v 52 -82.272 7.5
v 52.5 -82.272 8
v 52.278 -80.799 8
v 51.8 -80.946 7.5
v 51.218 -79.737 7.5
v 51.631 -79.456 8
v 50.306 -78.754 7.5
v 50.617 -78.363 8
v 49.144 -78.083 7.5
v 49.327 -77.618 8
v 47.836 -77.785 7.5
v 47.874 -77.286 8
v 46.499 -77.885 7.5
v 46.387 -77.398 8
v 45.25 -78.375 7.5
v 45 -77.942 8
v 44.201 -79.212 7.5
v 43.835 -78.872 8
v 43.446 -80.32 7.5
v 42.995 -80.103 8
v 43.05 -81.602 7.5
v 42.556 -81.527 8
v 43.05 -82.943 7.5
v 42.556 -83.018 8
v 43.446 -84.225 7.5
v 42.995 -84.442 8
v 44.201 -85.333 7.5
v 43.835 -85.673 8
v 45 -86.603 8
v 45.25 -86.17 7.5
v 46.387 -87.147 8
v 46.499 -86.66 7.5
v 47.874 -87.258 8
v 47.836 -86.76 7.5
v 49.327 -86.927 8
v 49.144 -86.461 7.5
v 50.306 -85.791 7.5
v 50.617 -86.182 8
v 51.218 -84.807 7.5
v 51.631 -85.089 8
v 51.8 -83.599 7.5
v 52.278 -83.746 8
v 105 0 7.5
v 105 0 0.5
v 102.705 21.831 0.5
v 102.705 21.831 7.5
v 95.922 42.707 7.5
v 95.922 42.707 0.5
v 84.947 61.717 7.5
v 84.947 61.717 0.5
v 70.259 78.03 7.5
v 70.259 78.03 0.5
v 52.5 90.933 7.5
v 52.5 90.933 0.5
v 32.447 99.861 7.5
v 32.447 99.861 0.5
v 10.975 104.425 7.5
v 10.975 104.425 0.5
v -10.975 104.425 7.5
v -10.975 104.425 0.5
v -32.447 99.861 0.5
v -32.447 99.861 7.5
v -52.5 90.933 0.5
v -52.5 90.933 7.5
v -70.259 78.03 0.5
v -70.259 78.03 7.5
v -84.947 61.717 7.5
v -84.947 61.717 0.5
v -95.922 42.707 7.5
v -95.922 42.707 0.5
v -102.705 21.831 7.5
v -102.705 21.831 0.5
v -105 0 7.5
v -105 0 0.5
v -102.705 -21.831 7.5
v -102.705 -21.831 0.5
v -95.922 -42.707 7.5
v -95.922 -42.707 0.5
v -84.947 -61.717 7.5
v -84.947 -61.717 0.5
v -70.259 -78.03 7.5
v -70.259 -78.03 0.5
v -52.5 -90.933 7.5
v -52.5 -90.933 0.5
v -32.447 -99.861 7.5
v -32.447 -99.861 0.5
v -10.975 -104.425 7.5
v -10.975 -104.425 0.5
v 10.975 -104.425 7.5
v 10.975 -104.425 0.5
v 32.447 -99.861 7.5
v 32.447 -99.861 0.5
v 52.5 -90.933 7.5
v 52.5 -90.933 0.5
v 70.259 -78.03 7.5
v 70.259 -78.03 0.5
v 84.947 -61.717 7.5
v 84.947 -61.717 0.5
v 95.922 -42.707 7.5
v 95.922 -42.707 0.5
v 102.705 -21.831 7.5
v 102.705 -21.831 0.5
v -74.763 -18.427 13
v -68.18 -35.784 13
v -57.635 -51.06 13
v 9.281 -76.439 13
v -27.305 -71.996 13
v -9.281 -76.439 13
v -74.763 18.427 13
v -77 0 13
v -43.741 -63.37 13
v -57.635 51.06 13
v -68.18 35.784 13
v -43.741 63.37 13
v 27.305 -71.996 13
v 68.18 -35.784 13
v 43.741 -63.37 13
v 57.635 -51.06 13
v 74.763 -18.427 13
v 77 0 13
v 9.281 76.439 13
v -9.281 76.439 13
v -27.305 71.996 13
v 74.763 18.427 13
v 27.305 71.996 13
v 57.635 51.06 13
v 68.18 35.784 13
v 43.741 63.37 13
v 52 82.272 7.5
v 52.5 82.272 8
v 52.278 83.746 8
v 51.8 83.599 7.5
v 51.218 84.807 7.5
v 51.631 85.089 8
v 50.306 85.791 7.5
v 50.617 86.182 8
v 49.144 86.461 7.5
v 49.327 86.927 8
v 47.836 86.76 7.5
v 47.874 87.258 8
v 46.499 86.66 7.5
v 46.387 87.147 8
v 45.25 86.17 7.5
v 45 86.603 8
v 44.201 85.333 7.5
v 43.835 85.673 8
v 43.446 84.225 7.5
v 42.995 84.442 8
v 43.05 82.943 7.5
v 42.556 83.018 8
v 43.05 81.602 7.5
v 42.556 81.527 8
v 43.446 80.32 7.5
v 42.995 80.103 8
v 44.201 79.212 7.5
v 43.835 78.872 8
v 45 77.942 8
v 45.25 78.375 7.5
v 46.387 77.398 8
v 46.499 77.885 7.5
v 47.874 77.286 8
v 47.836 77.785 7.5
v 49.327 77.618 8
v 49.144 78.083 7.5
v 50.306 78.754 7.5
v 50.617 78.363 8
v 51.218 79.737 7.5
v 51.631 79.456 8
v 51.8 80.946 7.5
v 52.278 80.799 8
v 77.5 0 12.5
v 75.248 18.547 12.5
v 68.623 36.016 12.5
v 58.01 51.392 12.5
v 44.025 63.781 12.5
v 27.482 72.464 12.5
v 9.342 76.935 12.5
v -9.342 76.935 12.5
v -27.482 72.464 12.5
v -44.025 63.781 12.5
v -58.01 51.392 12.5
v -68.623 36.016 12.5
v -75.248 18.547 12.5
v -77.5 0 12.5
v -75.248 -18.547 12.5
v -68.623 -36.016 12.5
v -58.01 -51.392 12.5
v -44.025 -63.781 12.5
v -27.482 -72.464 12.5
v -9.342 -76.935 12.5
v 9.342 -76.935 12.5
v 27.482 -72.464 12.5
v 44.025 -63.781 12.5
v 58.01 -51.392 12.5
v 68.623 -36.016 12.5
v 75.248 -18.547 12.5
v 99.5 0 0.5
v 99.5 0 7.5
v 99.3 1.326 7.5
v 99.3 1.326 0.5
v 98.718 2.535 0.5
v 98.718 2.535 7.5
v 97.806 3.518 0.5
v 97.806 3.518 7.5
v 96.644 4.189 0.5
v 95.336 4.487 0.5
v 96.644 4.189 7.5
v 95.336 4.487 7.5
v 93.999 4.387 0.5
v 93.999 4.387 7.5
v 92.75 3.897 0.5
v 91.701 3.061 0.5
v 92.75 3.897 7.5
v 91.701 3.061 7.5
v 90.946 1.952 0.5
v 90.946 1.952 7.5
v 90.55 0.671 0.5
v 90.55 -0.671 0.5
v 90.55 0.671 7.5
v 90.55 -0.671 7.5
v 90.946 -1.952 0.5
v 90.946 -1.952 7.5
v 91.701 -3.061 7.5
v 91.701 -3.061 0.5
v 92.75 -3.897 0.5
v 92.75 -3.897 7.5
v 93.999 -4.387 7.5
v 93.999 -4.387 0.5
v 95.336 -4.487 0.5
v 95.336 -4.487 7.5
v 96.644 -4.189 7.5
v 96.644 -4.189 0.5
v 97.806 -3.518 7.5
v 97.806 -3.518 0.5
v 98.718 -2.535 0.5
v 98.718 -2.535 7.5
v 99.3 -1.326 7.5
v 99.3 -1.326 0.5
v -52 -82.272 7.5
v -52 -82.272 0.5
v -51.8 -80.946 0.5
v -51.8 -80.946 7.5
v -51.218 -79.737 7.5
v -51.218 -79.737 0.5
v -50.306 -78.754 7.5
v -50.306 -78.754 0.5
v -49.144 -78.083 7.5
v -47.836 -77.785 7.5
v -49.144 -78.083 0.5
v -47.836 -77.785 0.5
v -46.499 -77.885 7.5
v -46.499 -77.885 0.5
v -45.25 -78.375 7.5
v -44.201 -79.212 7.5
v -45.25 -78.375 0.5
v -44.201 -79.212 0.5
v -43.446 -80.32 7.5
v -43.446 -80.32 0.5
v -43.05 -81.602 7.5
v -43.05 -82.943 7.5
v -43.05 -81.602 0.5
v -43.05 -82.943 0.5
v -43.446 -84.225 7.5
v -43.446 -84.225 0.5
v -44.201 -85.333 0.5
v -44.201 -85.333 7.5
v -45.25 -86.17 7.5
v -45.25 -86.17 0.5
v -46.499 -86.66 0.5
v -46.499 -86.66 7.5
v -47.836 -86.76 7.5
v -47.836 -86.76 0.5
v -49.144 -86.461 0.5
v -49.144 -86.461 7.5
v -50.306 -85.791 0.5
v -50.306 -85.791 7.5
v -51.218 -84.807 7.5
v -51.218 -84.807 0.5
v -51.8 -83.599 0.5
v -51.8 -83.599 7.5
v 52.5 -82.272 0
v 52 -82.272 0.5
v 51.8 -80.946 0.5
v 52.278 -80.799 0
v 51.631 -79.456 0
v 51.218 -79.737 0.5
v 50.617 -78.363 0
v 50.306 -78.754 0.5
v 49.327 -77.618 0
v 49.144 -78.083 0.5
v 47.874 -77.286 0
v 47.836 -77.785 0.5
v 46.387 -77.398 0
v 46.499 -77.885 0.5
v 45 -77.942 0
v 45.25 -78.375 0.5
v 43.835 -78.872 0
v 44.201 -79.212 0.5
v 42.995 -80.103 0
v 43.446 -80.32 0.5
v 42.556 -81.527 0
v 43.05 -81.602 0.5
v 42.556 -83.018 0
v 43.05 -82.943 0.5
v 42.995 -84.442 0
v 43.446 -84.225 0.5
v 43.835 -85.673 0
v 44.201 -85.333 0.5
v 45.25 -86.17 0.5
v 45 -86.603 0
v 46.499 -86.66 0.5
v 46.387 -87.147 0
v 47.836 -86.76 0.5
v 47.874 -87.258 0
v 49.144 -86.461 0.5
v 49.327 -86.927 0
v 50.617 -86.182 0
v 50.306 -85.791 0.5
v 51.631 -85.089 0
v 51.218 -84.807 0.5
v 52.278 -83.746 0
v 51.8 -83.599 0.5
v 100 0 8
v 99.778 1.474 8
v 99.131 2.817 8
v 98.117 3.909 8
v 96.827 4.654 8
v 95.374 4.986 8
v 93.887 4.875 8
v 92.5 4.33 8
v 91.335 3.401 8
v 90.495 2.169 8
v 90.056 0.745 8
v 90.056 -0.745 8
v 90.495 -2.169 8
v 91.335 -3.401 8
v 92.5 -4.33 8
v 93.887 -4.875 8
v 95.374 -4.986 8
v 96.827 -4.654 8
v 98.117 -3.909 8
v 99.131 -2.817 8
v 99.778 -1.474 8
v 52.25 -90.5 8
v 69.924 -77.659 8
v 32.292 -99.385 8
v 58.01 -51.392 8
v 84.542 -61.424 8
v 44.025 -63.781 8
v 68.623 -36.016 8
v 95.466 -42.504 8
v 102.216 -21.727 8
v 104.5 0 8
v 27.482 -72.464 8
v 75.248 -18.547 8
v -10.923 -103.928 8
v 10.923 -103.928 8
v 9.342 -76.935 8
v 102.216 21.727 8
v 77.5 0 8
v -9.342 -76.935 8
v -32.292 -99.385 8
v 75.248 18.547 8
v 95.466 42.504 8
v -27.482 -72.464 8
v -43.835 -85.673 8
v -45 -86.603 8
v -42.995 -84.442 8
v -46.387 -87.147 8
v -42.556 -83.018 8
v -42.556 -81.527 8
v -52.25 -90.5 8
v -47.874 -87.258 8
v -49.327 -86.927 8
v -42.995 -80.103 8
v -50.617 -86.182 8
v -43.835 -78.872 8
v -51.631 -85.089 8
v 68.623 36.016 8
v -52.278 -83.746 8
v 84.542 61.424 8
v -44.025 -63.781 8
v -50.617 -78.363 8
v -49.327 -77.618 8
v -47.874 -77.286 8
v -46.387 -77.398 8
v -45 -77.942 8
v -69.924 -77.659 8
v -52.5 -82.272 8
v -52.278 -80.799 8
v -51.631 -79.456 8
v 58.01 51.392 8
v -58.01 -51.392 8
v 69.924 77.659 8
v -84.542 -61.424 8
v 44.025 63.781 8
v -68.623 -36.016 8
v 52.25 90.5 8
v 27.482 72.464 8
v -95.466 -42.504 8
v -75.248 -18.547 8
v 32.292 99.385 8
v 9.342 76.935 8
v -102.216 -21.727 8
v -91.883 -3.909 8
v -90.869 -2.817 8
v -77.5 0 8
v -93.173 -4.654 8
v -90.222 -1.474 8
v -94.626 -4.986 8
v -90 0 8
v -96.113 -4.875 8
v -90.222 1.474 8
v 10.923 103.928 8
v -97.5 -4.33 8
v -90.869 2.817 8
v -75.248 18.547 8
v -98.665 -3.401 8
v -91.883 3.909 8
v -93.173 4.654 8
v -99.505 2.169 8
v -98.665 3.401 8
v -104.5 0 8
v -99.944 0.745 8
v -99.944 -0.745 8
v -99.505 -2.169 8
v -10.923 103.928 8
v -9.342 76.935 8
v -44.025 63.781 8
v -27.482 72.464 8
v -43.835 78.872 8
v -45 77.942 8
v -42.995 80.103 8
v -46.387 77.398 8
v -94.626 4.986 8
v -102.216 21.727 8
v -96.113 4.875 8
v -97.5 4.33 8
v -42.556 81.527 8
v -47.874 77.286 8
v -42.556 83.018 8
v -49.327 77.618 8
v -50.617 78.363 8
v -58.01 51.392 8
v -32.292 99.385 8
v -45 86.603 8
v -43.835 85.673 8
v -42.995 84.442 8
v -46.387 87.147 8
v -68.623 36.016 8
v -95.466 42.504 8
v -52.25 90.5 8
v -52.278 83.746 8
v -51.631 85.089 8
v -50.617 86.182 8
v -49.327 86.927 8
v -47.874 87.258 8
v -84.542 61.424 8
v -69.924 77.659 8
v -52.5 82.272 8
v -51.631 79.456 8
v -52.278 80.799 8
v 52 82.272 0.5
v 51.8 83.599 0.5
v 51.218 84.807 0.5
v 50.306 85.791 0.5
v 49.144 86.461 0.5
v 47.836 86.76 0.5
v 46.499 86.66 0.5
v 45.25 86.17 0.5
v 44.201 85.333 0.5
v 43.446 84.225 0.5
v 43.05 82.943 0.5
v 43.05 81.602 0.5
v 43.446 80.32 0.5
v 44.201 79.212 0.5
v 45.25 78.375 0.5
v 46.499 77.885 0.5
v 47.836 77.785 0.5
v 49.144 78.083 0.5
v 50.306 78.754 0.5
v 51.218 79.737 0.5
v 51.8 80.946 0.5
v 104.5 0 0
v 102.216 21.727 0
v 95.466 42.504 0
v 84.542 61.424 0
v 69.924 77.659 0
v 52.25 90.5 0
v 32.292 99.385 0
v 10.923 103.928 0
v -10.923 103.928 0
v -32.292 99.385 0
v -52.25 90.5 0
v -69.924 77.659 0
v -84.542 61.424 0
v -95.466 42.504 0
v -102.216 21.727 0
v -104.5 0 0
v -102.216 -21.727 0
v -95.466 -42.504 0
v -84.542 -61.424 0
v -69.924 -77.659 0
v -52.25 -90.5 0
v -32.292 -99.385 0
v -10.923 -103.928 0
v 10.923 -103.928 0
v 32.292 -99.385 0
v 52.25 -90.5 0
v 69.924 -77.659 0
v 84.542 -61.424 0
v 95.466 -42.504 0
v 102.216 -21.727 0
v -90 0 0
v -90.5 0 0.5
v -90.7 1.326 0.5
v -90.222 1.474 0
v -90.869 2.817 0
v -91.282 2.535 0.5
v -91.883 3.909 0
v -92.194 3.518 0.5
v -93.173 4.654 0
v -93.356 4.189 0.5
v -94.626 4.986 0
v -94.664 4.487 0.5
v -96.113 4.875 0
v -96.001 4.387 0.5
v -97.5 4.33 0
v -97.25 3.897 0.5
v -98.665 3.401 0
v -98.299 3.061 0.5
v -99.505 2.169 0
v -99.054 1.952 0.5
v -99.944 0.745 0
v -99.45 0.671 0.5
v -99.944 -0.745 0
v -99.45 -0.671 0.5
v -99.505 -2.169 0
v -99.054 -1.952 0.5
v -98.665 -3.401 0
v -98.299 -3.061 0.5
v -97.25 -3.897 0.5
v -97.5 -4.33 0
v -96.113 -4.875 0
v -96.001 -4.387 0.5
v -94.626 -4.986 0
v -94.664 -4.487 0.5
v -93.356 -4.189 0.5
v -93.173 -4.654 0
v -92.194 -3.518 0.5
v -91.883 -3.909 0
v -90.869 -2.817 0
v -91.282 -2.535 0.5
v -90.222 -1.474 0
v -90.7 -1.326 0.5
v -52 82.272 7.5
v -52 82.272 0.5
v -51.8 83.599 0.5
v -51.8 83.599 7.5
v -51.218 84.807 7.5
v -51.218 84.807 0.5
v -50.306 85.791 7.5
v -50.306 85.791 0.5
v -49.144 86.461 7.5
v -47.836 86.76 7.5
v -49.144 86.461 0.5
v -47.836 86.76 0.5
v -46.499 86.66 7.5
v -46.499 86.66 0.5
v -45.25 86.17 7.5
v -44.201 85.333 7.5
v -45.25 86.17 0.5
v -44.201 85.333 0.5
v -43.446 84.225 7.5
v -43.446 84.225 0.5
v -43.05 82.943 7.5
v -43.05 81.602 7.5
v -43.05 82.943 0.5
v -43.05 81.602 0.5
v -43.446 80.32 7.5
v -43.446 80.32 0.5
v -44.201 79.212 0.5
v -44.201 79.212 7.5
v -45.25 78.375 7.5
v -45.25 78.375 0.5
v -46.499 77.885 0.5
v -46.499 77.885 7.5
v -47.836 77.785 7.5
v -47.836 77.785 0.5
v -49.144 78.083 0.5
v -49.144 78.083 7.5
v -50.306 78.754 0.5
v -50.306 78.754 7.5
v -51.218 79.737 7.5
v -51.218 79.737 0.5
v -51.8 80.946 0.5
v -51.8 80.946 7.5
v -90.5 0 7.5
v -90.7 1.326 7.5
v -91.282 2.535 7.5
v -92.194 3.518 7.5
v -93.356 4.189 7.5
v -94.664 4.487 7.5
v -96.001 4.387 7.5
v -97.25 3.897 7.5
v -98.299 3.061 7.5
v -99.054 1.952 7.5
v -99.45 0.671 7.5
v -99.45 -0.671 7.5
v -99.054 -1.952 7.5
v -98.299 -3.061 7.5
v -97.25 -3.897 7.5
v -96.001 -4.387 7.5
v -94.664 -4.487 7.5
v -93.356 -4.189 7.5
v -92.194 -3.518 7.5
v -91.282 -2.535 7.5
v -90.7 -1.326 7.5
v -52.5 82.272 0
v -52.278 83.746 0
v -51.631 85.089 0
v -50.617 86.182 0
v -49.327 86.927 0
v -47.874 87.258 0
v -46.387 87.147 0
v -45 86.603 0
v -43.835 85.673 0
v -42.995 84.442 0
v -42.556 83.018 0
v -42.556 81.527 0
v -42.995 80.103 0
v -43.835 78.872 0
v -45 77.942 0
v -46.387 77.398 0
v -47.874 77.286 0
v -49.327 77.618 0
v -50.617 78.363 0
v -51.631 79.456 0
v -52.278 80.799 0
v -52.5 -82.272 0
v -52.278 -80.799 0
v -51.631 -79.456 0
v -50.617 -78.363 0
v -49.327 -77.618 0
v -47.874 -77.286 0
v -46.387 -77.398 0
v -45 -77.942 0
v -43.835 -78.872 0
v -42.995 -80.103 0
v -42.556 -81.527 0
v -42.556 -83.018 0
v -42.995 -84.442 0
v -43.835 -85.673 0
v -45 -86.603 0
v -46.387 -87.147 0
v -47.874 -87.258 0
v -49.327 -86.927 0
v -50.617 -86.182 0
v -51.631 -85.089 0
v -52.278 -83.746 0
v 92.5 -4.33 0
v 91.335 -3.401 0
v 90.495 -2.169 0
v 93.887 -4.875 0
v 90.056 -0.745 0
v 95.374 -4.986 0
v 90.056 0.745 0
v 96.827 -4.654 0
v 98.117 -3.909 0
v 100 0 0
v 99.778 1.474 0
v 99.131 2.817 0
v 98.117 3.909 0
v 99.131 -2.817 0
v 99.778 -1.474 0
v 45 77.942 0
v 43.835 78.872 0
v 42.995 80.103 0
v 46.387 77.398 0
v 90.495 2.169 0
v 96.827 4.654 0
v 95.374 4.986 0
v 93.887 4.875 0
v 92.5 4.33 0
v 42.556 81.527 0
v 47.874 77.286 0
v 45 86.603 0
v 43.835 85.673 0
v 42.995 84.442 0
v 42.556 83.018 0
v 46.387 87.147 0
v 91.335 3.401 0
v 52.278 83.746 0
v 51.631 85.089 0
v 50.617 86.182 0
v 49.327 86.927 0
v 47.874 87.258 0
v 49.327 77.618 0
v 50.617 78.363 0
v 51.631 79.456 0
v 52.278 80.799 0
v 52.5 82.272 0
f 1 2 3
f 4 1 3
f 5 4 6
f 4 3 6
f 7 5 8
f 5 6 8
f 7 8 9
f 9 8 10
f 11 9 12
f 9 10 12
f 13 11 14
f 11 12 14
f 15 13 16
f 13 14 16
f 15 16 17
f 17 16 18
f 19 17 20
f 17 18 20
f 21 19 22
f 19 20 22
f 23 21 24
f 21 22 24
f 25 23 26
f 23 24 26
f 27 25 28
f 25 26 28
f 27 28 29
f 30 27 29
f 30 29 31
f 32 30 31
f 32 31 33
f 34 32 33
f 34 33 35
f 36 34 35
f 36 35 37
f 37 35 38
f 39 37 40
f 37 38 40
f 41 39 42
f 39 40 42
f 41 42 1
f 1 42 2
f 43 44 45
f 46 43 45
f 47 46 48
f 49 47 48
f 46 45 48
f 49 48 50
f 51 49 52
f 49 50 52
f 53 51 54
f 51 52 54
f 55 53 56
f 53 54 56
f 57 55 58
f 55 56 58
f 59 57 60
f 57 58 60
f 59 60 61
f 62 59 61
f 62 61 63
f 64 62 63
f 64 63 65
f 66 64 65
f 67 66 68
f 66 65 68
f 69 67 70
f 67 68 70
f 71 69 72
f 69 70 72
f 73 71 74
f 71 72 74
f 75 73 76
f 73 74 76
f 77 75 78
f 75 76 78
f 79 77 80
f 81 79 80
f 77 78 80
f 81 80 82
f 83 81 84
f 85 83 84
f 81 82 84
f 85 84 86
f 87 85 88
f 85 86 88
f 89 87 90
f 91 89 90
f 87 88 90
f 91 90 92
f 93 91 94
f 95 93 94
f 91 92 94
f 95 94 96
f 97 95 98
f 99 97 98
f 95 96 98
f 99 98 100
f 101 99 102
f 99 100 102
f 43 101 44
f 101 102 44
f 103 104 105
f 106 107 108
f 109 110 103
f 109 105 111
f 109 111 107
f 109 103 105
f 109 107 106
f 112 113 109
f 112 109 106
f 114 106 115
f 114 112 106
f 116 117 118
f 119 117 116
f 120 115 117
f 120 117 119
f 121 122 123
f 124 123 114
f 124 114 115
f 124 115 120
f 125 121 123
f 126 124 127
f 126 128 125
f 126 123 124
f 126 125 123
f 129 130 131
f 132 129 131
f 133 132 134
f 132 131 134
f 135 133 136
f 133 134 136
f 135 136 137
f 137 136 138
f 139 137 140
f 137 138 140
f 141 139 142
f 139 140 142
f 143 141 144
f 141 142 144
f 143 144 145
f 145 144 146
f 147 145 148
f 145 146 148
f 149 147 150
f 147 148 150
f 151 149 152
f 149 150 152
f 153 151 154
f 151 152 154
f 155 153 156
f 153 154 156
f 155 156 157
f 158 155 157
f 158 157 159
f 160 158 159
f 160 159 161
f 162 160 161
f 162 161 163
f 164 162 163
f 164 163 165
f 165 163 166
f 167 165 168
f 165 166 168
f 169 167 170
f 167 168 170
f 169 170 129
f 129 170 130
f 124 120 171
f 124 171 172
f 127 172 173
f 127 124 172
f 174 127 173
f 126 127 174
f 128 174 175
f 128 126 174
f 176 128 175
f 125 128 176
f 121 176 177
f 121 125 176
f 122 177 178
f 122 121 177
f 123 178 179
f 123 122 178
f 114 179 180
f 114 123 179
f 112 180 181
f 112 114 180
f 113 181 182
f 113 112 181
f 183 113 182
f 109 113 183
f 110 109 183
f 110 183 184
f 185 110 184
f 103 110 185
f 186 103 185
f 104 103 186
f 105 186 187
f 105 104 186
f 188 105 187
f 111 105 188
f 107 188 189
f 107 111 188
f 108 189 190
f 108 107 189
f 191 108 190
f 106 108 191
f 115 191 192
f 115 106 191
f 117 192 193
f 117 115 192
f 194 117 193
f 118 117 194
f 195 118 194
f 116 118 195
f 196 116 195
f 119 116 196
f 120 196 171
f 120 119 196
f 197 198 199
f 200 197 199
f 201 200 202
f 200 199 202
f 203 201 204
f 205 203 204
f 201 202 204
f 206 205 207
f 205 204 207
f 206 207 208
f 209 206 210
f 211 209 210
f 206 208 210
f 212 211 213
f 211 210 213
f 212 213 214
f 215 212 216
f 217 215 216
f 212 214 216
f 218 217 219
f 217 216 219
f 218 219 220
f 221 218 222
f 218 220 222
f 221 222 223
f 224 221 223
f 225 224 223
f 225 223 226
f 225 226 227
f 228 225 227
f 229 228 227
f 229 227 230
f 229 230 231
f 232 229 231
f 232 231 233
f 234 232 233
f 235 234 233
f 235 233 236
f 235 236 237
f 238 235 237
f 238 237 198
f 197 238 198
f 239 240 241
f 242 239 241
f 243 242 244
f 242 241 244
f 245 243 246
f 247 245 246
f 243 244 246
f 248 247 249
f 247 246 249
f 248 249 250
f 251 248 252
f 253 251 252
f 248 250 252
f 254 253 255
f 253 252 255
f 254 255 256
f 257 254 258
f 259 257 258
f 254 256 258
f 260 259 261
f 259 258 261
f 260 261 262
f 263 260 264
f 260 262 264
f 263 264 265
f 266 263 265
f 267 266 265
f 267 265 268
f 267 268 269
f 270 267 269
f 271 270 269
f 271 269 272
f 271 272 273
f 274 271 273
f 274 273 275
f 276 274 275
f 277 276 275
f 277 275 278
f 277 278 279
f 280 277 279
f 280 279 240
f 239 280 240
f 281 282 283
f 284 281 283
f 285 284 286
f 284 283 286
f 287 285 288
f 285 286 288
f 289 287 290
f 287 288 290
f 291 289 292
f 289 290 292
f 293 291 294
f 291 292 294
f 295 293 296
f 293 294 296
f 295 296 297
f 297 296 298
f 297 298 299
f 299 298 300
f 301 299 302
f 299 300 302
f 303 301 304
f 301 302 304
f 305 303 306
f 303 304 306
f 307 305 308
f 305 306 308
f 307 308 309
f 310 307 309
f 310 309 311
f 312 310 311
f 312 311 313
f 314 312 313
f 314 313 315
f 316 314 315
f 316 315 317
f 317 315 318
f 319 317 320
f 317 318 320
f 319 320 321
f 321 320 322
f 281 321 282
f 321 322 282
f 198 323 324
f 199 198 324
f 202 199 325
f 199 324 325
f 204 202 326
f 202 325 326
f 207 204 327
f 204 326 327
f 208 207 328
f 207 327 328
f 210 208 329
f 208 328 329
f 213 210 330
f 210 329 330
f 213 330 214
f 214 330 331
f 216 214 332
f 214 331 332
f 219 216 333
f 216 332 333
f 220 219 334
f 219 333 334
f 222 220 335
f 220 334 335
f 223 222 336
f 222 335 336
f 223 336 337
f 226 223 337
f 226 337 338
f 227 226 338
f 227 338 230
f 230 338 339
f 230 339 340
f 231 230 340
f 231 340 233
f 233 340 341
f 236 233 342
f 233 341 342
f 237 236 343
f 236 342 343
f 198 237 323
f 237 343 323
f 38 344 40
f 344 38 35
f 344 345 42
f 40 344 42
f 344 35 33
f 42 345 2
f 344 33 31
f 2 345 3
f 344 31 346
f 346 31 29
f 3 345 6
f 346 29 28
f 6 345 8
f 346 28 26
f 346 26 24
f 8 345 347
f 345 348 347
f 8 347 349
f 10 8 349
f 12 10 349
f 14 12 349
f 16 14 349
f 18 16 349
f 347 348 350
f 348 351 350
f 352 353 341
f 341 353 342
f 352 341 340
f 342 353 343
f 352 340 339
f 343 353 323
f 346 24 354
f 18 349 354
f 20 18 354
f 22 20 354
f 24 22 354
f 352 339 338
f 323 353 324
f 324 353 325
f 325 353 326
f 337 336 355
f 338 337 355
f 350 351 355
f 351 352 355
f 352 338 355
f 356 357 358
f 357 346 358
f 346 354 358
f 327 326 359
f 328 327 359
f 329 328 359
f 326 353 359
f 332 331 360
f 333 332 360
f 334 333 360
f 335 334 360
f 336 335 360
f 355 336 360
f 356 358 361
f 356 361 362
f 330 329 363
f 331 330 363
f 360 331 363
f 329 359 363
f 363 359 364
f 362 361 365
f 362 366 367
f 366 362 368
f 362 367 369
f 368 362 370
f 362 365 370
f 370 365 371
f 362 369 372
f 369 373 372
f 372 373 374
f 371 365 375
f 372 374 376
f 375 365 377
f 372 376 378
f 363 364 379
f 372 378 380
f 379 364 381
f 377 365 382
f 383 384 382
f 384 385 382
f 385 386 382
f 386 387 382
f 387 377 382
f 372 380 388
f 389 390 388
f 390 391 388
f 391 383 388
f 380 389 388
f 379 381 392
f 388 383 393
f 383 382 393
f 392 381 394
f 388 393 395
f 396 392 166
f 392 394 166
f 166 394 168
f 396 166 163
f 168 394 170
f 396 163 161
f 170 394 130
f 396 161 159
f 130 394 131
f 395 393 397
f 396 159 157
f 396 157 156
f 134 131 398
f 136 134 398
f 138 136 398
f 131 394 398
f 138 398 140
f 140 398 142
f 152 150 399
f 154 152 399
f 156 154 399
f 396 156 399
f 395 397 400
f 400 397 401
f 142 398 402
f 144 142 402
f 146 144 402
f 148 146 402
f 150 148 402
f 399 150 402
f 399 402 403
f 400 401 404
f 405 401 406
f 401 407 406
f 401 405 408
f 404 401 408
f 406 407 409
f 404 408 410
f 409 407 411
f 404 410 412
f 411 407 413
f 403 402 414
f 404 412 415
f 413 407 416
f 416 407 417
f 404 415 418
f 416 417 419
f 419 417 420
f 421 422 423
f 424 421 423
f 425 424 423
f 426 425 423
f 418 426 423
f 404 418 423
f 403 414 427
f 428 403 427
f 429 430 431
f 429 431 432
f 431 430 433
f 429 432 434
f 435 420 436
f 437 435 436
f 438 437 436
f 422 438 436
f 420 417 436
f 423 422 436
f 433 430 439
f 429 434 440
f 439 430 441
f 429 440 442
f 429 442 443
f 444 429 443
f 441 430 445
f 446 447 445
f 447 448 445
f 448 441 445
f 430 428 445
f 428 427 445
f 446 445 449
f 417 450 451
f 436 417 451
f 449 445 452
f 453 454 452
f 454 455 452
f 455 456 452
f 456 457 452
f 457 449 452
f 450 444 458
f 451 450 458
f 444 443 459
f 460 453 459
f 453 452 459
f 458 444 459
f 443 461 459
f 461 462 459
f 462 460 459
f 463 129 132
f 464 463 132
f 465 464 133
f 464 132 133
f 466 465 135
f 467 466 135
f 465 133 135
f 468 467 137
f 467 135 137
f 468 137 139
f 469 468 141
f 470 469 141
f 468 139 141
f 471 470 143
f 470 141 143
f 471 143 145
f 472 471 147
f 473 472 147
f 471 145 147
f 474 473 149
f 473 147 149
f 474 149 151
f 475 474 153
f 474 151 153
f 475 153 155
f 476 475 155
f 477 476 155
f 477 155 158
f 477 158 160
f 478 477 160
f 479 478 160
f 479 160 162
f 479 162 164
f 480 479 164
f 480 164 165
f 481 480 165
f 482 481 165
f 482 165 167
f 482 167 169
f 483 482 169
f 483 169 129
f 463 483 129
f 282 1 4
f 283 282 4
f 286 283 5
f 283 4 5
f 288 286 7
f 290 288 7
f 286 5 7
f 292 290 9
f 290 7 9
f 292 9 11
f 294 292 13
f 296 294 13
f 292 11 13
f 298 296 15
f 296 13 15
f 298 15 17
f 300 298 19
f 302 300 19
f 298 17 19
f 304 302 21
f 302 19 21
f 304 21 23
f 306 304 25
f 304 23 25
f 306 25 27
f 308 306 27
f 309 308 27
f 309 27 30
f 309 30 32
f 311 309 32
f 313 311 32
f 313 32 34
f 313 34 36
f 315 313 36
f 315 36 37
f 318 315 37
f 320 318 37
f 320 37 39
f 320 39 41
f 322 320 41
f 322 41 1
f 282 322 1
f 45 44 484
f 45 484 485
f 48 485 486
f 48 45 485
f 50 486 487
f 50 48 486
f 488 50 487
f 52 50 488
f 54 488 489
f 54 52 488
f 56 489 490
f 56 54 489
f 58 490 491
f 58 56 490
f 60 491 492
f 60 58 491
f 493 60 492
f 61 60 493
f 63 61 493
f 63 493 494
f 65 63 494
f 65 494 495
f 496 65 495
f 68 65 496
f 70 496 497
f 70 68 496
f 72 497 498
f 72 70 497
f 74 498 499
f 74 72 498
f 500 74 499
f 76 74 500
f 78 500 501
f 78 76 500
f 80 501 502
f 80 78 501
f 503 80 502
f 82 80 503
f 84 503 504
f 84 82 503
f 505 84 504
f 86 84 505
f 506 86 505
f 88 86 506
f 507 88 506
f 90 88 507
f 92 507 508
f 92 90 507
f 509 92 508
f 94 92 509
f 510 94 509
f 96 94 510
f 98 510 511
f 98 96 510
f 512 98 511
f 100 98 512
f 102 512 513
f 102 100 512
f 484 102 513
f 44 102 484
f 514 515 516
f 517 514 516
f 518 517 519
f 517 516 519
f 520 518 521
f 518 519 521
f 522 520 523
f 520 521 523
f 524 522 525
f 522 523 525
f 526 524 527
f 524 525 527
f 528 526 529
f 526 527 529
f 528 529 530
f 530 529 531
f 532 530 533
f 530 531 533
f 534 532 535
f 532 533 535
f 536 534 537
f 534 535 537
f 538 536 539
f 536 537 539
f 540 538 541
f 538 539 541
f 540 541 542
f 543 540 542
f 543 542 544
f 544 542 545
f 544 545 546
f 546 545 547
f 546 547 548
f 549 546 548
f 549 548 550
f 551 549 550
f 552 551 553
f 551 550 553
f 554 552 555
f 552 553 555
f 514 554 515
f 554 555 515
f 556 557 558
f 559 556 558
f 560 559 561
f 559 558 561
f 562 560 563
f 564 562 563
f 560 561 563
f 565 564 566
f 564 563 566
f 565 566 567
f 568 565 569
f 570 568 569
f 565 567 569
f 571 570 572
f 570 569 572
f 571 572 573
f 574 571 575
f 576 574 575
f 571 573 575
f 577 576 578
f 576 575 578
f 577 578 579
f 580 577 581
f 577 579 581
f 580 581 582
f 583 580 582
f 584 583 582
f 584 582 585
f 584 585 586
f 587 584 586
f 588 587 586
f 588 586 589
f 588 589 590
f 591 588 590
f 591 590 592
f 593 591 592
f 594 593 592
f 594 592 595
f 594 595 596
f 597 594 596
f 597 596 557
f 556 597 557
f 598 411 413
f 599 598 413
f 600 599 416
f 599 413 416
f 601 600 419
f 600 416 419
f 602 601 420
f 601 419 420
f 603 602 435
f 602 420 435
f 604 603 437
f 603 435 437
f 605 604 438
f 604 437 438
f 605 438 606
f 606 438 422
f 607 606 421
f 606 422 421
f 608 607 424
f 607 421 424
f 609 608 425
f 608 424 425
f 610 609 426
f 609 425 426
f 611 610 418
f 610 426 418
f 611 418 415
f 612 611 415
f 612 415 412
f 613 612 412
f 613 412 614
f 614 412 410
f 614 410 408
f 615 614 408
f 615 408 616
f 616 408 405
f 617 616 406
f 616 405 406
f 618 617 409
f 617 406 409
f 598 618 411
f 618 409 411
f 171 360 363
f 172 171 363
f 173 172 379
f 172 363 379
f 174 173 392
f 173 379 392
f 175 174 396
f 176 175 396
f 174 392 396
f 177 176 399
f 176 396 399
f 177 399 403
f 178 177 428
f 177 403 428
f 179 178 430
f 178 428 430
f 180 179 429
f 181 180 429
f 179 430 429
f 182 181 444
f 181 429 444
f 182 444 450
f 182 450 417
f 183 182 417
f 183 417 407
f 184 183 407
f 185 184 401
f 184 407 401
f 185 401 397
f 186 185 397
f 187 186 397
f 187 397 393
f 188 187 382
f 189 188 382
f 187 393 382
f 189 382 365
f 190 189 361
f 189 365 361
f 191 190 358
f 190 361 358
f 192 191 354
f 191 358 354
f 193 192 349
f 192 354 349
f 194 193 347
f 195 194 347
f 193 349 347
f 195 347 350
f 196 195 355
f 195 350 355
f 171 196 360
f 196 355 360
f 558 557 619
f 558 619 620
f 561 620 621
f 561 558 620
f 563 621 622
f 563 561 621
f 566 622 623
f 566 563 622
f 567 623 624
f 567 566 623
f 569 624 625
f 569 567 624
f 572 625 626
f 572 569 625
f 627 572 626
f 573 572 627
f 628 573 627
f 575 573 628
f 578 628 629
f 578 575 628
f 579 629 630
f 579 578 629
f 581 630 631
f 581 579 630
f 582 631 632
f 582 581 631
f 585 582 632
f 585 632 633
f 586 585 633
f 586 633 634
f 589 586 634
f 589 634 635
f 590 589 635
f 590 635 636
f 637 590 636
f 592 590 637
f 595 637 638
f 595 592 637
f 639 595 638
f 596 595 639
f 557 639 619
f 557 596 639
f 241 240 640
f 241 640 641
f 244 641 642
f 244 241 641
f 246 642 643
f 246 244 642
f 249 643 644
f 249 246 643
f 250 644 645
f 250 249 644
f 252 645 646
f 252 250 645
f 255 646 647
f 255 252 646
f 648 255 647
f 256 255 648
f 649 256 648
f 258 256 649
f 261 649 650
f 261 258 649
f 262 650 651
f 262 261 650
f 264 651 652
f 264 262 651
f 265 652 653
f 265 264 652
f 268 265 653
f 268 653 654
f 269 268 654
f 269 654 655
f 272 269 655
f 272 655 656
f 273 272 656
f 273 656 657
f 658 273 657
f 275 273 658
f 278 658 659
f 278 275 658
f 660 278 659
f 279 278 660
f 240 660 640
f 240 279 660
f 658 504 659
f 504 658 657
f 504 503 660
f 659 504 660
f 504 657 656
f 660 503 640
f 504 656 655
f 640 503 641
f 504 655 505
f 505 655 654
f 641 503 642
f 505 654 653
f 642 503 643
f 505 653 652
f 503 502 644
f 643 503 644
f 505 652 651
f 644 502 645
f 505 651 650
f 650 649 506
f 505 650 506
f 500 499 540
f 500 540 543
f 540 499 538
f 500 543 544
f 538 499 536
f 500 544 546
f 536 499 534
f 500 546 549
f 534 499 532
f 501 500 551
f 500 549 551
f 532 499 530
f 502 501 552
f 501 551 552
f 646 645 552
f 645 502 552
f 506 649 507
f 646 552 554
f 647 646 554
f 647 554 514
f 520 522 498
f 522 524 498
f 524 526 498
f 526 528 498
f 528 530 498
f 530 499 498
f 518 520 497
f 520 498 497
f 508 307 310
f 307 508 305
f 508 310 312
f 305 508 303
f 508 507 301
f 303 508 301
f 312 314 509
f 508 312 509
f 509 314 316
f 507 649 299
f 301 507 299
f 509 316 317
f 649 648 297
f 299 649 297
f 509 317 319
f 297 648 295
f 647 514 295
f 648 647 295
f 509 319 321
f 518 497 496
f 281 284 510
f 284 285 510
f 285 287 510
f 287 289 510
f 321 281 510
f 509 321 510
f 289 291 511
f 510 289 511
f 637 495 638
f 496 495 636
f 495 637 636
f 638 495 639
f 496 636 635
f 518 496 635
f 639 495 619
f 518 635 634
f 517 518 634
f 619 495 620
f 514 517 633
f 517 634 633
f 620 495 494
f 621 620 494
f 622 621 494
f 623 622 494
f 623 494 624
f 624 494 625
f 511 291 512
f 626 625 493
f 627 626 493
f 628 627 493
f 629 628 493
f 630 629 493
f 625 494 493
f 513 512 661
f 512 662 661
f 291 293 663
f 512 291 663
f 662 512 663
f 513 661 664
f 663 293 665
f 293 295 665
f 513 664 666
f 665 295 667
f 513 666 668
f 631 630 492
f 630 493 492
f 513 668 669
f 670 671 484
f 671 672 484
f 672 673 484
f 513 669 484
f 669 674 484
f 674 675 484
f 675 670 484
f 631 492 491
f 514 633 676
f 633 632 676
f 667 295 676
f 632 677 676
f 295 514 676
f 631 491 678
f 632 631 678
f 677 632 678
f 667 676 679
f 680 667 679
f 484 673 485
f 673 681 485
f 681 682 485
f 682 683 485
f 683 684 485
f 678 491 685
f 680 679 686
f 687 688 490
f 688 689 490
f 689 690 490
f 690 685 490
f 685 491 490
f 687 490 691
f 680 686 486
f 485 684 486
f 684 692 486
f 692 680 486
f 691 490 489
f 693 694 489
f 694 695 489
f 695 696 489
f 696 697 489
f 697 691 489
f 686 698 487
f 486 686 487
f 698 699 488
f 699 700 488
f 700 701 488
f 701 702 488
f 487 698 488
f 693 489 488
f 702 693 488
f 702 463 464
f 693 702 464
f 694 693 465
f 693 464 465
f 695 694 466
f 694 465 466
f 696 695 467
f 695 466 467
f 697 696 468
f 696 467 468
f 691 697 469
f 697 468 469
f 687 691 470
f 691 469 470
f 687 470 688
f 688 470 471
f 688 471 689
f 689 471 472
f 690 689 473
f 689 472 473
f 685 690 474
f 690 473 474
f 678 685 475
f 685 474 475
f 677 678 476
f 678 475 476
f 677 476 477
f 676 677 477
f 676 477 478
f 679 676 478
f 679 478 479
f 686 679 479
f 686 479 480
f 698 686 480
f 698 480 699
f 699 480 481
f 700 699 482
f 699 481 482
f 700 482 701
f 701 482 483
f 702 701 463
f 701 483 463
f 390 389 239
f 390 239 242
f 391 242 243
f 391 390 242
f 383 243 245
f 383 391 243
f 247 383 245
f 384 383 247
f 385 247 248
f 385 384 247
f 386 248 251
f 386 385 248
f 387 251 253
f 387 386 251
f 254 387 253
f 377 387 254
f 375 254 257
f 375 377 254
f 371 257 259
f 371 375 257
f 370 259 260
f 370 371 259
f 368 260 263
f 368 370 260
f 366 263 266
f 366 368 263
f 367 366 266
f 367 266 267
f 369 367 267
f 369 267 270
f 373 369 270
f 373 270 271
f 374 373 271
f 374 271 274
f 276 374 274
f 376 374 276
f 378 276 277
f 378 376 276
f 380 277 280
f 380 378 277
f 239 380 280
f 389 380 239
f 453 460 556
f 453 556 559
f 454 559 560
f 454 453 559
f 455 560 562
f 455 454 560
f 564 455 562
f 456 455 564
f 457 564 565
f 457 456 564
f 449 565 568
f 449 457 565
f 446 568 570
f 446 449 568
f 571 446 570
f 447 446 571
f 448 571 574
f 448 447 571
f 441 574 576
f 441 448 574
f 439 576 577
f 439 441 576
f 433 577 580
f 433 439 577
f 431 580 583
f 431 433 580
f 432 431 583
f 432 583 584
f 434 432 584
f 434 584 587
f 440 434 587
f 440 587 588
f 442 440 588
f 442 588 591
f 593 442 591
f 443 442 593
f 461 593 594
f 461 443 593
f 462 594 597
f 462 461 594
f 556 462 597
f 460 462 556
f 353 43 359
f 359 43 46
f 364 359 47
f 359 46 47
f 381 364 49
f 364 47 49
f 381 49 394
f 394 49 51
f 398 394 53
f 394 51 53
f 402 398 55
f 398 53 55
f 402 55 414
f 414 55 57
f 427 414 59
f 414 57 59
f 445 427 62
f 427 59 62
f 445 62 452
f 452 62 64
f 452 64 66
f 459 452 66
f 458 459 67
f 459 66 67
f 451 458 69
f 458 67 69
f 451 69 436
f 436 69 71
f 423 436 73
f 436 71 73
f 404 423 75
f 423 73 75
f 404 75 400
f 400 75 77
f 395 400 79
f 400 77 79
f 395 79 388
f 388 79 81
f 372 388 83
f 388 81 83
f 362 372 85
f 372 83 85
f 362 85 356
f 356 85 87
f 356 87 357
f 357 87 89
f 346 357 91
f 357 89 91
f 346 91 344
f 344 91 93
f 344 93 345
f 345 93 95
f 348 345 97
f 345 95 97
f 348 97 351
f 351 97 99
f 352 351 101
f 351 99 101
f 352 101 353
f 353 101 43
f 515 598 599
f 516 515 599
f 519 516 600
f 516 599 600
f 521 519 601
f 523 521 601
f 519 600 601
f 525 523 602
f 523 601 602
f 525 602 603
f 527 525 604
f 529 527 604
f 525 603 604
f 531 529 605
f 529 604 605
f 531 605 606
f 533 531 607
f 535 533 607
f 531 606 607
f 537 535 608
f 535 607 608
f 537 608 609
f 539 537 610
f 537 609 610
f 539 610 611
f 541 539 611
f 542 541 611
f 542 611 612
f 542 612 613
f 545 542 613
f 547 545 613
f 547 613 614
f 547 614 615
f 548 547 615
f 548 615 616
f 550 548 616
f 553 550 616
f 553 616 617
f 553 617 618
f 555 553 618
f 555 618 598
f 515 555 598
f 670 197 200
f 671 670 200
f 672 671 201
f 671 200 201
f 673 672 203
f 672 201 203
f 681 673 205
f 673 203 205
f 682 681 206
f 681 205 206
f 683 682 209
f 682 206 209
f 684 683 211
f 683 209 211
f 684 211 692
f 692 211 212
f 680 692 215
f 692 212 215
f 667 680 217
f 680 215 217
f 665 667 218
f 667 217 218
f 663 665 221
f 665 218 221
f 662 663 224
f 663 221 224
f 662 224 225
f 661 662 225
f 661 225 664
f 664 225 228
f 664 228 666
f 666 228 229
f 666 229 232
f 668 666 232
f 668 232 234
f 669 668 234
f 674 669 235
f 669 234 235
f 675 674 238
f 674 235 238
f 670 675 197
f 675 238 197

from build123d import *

# Parameters (mm, degrees)
HOLE1_D             = 9
HOLE2_D             = 9
SKETCH6_R           = 77.5
BOSS_EXTRUDE1_DEPTH = 5
CHAMFER1_SIZE       = 0.5


with BuildPart() as part:
    # Sketch1 → Revolve1 (revolve)
    with BuildSketch(Plane(origin=(0, 0, 0), x_dir=(1, 0, 0), z_dir=(0, 1, 0))):
        Polygon((105, 0), (0, 0), (0, -8), (104.5, -8), (105, -7.5), align=None)
    revolve(axis=Axis((0, 0, 0), (0, 0, 1)))

    # Hole1 (through all)
    with Locations(Plane.XY.offset(8)):
        with Locations((-47.5, -82.27241336), (-47.5, 82.27241336)):
            Hole(HOLE1_D / 2)

    # Hole2 (through all)
    with Locations(Plane(origin=(0, 0, 0), x_dir=(-1, 0, 0), z_dir=(0, 0, -1))):
        with Locations((-47.5, -82.27241336), (95, 0), (-47.5, 82.27241336), (-95, 0)):
            Hole(HOLE2_D / 2)

    # Sketch6 → Boss-Extrude1 (add)
    with BuildSketch(Plane.XY.offset(8)):
        Circle(SKETCH6_R)
    extrude(amount=BOSS_EXTRUDE1_DEPTH)

    # Chamfer1
    chamfer1_edges = [part.edges().sort_by_distance(p)[0] for p in [
        (-43, 82.27241336, 8),
        (-43, 82.27241336, 0),
        (-43, -82.27241336, 8),
        (-43, -82.27241336, 0),
        (90.5, 0, 0),
        (90.5, 0, 8),
        (43, 82.27241336, 0),
        (43, 82.27241336, 8),
        (-99.5, 0, 0),
        (-99.5, 0, 8),
        (43, -82.27241336, 0),
        (43, -82.27241336, 8),
        (-77.5, 0, 13),
        (-105, 0, 0),
    ]]
    chamfer(chamfer1_edges, length=CHAMFER1_SIZE)


solid = part.part
